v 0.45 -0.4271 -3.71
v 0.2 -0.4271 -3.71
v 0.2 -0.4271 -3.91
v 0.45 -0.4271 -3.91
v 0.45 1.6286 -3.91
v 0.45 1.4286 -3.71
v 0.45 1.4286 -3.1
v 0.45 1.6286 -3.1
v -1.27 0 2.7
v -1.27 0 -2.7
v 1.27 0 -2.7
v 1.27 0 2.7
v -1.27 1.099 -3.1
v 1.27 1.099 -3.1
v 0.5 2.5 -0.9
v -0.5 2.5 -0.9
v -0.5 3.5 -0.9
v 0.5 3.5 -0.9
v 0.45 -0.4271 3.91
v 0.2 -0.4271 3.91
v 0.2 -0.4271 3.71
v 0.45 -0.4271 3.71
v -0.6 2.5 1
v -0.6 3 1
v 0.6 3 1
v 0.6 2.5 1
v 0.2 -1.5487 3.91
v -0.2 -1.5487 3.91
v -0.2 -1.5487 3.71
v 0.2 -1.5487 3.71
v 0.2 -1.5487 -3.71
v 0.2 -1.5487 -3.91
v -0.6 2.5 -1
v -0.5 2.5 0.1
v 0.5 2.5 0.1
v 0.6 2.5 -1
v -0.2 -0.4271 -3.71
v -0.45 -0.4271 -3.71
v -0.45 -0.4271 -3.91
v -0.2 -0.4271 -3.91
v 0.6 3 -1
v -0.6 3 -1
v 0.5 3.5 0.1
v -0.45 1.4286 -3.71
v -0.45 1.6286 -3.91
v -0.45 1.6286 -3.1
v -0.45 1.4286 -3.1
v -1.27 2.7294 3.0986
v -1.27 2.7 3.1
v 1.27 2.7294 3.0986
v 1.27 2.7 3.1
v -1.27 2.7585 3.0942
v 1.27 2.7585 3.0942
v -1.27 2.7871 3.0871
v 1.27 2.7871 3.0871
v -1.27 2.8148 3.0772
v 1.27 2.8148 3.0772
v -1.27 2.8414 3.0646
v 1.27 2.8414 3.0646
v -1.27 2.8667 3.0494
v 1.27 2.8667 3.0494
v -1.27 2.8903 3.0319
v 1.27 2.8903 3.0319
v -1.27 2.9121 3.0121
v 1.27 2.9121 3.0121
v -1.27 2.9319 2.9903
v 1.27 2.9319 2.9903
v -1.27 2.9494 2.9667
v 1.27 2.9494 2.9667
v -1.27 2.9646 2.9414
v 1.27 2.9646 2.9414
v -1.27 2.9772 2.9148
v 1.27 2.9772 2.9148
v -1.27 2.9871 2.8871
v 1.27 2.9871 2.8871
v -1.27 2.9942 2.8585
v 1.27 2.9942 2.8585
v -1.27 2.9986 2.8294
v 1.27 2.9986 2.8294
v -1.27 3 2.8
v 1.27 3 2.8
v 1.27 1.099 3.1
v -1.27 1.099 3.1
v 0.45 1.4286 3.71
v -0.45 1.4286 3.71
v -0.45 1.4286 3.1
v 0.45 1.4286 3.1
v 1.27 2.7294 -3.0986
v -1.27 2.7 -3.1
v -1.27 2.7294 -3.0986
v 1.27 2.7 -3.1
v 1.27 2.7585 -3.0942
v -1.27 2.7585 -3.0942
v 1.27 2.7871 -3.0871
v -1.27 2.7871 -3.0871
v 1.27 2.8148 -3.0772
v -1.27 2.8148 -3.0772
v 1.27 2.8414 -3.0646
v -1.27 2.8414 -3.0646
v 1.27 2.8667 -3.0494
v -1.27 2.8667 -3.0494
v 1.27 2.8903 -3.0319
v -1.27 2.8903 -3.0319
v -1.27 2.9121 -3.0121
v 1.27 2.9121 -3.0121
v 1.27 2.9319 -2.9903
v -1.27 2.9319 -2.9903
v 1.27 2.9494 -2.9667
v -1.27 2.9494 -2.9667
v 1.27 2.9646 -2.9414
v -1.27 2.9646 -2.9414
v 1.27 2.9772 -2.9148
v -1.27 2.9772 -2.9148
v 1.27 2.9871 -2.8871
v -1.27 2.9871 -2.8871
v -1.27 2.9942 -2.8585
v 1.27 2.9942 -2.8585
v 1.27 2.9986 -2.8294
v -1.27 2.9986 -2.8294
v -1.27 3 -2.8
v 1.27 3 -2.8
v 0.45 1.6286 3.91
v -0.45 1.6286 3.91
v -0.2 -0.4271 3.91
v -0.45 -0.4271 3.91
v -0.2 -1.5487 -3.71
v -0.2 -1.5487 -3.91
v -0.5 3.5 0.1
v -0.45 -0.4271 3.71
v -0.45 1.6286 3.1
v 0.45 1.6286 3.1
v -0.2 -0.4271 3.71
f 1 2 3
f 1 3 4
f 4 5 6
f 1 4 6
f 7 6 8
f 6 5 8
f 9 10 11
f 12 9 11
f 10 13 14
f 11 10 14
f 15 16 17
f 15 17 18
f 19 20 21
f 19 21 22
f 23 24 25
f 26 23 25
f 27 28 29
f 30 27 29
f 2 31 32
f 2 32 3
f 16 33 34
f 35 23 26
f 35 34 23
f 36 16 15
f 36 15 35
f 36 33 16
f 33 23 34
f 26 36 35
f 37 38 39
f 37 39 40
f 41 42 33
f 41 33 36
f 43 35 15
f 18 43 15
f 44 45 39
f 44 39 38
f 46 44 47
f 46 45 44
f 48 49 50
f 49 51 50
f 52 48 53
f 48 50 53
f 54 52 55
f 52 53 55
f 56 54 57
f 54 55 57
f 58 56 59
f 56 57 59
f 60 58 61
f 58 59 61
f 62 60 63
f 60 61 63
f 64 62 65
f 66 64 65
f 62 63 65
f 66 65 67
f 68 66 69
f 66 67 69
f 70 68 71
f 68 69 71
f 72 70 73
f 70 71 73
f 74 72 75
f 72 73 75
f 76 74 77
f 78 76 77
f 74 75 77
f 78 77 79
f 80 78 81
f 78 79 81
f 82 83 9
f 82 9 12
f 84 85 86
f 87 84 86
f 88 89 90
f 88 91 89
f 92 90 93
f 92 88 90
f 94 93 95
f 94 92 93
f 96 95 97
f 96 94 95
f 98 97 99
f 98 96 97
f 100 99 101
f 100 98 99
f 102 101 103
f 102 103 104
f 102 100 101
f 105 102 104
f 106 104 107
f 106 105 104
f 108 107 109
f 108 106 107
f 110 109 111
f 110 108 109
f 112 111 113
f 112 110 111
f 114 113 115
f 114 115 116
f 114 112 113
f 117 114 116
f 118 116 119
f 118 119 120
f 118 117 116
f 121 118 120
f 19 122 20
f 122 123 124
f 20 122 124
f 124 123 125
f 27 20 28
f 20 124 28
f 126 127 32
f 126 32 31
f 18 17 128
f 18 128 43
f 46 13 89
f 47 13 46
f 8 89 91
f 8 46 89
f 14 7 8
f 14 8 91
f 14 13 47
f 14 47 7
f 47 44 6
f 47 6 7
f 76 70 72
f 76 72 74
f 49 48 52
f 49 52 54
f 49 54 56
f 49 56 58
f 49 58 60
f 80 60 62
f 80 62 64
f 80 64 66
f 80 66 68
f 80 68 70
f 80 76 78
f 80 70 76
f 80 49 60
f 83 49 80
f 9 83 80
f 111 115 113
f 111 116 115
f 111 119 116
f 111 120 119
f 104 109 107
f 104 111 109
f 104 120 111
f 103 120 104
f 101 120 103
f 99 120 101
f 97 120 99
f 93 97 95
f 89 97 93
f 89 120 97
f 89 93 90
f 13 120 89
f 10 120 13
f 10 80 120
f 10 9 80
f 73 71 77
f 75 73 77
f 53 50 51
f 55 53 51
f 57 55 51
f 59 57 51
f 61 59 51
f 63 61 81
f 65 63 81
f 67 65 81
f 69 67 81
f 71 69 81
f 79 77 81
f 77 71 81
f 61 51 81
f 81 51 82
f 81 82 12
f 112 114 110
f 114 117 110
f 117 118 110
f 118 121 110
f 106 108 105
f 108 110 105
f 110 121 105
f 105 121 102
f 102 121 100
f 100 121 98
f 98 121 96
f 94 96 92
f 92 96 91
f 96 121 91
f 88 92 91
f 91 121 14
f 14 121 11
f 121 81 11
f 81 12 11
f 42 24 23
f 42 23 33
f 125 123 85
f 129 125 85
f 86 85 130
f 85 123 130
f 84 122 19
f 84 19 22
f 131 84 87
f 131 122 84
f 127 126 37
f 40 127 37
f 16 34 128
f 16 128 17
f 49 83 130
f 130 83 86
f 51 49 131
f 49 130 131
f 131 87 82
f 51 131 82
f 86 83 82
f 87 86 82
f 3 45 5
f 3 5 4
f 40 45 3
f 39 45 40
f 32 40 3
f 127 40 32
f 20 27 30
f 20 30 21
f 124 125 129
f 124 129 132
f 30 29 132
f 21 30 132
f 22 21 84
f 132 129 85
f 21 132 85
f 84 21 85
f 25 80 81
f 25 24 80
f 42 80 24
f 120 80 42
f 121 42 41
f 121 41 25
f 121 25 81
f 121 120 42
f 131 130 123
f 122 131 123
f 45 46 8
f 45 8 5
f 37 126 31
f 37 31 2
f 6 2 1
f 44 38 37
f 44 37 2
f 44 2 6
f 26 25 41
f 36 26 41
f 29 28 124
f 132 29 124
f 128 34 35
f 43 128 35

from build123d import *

# Parameters (mm, degrees)
SKETCH_1_W           = 2.54
SKETCH_1_H           = 6.2
EXTRUDE_1_DEPTH      = 3
SKETCH_2_W           = 1.2
SKETCH_2_H           = 2
CUT_EXTRUDE_1_DEPTH  = 0.5
SKETCH_3_W           = 1
SKETCH_3_H           = 1
EXTRUDE_1_2_DEPTH    = 1
FILLET_1_R           = 0.3
CHAMFER_1_SIZE       = 0.4
CHAMFER_1_SIZE2      = 1.098990968
EXTRUDE_2_DEPTH      = 0.45
EXTRUDE_2_DEPTH_BACK = 0.45
SKETCH_5_W           = 0.25
SKETCH_5_H           = 1.121567526
CUT_EXTRUDE_2_DEPTH  = 9.661137339


with BuildPart() as part:
    # 草图1 → Extrude 1 (new body)
    with BuildSketch(Plane(origin=(0, 0, 0), x_dir=(1, 0, 0), z_dir=(0, 1, 0))):
        Rectangle(SKETCH_1_W, SKETCH_1_H)
    extrude(amount=EXTRUDE_1_DEPTH)

    # 草图2 → 切除-拉伸1 (cut)
    with BuildSketch(Plane(origin=(0, 3, 0), x_dir=(1, 0, 0), z_dir=(0, 1, 0))):
        Rectangle(SKETCH_2_W, SKETCH_2_H)
    extrude(amount=-CUT_EXTRUDE_1_DEPTH, mode=Mode.SUBTRACT)

    # 草图3 → Extrude 1 2 (add)
    with BuildSketch(Plane(origin=(0, 2.5, 0), x_dir=(1, 0, 0), z_dir=(0, 1, 0))):
        with Locations((0, 0.4)):
            Rectangle(SKETCH_3_W, SKETCH_3_H)
    extrude(amount=EXTRUDE_1_2_DEPTH)

    # 圆角1
    fillet_1_edges = [part.edges().sort_by_distance(p)[0] for p in [
        (0, 3, -3.1),
        (0, 3, 3.1),
    ]]
    fillet(fillet_1_edges, radius=FILLET_1_R)

    # 倒角1
    chamfer_1_edges = [part.edges().sort_by_distance(p)[0] for p in [
        (0, 0, -3.1),
        (0, 0, 3.1),
    ]]
    chamfer_1_side = [part.faces().sort_by_distance(p)[0] for p in [
        (0, 0, 0),
    ]]
    chamfer(chamfer_1_edges, length=CHAMFER_1_SIZE, length2=CHAMFER_1_SIZE2, reference=chamfer_1_side[0])

    # 草图4 → 凸台-拉伸2 (add, two sides: drawn at the far end of the back side and taken through both)
    with BuildSketch(Plane(origin=(0, 0, 0), x_dir=(0, 0, -1), z_dir=(1, 0, 0)).offset(-EXTRUDE_2_DEPTH_BACK)):
        Polygon((-2.805439179, 1.628598981), (-3.91, 1.628598981), (-3.91, -1.548691293), (-3.71, -1.548691293), (-3.71, 1.428598981), (-2.805439179, 1.428598981), align=None)
        Polygon((2.805439179, 1.428598981), (2.805439179, 1.628598981), (3.91, 1.628598981), (3.91, -1.548691293), (3.71, -1.548691293), (3.71, 1.428598981), align=None)
    extrude(amount=EXTRUDE_2_DEPTH + EXTRUDE_2_DEPTH_BACK)

    # 草图5 → 切除-拉伸2 (cut, through all)
    with BuildSketch(Plane.XY.offset(3.91)):
        with Locations((0.325, -0.98790753)):
            Rectangle(SKETCH_5_W, SKETCH_5_H)
        with Locations((-0.325, -0.98790753)):
            Rectangle(SKETCH_5_W, SKETCH_5_H)
    extrude(amount=-CUT_EXTRUDE_2_DEPTH, mode=Mode.SUBTRACT)


solid = part.part
